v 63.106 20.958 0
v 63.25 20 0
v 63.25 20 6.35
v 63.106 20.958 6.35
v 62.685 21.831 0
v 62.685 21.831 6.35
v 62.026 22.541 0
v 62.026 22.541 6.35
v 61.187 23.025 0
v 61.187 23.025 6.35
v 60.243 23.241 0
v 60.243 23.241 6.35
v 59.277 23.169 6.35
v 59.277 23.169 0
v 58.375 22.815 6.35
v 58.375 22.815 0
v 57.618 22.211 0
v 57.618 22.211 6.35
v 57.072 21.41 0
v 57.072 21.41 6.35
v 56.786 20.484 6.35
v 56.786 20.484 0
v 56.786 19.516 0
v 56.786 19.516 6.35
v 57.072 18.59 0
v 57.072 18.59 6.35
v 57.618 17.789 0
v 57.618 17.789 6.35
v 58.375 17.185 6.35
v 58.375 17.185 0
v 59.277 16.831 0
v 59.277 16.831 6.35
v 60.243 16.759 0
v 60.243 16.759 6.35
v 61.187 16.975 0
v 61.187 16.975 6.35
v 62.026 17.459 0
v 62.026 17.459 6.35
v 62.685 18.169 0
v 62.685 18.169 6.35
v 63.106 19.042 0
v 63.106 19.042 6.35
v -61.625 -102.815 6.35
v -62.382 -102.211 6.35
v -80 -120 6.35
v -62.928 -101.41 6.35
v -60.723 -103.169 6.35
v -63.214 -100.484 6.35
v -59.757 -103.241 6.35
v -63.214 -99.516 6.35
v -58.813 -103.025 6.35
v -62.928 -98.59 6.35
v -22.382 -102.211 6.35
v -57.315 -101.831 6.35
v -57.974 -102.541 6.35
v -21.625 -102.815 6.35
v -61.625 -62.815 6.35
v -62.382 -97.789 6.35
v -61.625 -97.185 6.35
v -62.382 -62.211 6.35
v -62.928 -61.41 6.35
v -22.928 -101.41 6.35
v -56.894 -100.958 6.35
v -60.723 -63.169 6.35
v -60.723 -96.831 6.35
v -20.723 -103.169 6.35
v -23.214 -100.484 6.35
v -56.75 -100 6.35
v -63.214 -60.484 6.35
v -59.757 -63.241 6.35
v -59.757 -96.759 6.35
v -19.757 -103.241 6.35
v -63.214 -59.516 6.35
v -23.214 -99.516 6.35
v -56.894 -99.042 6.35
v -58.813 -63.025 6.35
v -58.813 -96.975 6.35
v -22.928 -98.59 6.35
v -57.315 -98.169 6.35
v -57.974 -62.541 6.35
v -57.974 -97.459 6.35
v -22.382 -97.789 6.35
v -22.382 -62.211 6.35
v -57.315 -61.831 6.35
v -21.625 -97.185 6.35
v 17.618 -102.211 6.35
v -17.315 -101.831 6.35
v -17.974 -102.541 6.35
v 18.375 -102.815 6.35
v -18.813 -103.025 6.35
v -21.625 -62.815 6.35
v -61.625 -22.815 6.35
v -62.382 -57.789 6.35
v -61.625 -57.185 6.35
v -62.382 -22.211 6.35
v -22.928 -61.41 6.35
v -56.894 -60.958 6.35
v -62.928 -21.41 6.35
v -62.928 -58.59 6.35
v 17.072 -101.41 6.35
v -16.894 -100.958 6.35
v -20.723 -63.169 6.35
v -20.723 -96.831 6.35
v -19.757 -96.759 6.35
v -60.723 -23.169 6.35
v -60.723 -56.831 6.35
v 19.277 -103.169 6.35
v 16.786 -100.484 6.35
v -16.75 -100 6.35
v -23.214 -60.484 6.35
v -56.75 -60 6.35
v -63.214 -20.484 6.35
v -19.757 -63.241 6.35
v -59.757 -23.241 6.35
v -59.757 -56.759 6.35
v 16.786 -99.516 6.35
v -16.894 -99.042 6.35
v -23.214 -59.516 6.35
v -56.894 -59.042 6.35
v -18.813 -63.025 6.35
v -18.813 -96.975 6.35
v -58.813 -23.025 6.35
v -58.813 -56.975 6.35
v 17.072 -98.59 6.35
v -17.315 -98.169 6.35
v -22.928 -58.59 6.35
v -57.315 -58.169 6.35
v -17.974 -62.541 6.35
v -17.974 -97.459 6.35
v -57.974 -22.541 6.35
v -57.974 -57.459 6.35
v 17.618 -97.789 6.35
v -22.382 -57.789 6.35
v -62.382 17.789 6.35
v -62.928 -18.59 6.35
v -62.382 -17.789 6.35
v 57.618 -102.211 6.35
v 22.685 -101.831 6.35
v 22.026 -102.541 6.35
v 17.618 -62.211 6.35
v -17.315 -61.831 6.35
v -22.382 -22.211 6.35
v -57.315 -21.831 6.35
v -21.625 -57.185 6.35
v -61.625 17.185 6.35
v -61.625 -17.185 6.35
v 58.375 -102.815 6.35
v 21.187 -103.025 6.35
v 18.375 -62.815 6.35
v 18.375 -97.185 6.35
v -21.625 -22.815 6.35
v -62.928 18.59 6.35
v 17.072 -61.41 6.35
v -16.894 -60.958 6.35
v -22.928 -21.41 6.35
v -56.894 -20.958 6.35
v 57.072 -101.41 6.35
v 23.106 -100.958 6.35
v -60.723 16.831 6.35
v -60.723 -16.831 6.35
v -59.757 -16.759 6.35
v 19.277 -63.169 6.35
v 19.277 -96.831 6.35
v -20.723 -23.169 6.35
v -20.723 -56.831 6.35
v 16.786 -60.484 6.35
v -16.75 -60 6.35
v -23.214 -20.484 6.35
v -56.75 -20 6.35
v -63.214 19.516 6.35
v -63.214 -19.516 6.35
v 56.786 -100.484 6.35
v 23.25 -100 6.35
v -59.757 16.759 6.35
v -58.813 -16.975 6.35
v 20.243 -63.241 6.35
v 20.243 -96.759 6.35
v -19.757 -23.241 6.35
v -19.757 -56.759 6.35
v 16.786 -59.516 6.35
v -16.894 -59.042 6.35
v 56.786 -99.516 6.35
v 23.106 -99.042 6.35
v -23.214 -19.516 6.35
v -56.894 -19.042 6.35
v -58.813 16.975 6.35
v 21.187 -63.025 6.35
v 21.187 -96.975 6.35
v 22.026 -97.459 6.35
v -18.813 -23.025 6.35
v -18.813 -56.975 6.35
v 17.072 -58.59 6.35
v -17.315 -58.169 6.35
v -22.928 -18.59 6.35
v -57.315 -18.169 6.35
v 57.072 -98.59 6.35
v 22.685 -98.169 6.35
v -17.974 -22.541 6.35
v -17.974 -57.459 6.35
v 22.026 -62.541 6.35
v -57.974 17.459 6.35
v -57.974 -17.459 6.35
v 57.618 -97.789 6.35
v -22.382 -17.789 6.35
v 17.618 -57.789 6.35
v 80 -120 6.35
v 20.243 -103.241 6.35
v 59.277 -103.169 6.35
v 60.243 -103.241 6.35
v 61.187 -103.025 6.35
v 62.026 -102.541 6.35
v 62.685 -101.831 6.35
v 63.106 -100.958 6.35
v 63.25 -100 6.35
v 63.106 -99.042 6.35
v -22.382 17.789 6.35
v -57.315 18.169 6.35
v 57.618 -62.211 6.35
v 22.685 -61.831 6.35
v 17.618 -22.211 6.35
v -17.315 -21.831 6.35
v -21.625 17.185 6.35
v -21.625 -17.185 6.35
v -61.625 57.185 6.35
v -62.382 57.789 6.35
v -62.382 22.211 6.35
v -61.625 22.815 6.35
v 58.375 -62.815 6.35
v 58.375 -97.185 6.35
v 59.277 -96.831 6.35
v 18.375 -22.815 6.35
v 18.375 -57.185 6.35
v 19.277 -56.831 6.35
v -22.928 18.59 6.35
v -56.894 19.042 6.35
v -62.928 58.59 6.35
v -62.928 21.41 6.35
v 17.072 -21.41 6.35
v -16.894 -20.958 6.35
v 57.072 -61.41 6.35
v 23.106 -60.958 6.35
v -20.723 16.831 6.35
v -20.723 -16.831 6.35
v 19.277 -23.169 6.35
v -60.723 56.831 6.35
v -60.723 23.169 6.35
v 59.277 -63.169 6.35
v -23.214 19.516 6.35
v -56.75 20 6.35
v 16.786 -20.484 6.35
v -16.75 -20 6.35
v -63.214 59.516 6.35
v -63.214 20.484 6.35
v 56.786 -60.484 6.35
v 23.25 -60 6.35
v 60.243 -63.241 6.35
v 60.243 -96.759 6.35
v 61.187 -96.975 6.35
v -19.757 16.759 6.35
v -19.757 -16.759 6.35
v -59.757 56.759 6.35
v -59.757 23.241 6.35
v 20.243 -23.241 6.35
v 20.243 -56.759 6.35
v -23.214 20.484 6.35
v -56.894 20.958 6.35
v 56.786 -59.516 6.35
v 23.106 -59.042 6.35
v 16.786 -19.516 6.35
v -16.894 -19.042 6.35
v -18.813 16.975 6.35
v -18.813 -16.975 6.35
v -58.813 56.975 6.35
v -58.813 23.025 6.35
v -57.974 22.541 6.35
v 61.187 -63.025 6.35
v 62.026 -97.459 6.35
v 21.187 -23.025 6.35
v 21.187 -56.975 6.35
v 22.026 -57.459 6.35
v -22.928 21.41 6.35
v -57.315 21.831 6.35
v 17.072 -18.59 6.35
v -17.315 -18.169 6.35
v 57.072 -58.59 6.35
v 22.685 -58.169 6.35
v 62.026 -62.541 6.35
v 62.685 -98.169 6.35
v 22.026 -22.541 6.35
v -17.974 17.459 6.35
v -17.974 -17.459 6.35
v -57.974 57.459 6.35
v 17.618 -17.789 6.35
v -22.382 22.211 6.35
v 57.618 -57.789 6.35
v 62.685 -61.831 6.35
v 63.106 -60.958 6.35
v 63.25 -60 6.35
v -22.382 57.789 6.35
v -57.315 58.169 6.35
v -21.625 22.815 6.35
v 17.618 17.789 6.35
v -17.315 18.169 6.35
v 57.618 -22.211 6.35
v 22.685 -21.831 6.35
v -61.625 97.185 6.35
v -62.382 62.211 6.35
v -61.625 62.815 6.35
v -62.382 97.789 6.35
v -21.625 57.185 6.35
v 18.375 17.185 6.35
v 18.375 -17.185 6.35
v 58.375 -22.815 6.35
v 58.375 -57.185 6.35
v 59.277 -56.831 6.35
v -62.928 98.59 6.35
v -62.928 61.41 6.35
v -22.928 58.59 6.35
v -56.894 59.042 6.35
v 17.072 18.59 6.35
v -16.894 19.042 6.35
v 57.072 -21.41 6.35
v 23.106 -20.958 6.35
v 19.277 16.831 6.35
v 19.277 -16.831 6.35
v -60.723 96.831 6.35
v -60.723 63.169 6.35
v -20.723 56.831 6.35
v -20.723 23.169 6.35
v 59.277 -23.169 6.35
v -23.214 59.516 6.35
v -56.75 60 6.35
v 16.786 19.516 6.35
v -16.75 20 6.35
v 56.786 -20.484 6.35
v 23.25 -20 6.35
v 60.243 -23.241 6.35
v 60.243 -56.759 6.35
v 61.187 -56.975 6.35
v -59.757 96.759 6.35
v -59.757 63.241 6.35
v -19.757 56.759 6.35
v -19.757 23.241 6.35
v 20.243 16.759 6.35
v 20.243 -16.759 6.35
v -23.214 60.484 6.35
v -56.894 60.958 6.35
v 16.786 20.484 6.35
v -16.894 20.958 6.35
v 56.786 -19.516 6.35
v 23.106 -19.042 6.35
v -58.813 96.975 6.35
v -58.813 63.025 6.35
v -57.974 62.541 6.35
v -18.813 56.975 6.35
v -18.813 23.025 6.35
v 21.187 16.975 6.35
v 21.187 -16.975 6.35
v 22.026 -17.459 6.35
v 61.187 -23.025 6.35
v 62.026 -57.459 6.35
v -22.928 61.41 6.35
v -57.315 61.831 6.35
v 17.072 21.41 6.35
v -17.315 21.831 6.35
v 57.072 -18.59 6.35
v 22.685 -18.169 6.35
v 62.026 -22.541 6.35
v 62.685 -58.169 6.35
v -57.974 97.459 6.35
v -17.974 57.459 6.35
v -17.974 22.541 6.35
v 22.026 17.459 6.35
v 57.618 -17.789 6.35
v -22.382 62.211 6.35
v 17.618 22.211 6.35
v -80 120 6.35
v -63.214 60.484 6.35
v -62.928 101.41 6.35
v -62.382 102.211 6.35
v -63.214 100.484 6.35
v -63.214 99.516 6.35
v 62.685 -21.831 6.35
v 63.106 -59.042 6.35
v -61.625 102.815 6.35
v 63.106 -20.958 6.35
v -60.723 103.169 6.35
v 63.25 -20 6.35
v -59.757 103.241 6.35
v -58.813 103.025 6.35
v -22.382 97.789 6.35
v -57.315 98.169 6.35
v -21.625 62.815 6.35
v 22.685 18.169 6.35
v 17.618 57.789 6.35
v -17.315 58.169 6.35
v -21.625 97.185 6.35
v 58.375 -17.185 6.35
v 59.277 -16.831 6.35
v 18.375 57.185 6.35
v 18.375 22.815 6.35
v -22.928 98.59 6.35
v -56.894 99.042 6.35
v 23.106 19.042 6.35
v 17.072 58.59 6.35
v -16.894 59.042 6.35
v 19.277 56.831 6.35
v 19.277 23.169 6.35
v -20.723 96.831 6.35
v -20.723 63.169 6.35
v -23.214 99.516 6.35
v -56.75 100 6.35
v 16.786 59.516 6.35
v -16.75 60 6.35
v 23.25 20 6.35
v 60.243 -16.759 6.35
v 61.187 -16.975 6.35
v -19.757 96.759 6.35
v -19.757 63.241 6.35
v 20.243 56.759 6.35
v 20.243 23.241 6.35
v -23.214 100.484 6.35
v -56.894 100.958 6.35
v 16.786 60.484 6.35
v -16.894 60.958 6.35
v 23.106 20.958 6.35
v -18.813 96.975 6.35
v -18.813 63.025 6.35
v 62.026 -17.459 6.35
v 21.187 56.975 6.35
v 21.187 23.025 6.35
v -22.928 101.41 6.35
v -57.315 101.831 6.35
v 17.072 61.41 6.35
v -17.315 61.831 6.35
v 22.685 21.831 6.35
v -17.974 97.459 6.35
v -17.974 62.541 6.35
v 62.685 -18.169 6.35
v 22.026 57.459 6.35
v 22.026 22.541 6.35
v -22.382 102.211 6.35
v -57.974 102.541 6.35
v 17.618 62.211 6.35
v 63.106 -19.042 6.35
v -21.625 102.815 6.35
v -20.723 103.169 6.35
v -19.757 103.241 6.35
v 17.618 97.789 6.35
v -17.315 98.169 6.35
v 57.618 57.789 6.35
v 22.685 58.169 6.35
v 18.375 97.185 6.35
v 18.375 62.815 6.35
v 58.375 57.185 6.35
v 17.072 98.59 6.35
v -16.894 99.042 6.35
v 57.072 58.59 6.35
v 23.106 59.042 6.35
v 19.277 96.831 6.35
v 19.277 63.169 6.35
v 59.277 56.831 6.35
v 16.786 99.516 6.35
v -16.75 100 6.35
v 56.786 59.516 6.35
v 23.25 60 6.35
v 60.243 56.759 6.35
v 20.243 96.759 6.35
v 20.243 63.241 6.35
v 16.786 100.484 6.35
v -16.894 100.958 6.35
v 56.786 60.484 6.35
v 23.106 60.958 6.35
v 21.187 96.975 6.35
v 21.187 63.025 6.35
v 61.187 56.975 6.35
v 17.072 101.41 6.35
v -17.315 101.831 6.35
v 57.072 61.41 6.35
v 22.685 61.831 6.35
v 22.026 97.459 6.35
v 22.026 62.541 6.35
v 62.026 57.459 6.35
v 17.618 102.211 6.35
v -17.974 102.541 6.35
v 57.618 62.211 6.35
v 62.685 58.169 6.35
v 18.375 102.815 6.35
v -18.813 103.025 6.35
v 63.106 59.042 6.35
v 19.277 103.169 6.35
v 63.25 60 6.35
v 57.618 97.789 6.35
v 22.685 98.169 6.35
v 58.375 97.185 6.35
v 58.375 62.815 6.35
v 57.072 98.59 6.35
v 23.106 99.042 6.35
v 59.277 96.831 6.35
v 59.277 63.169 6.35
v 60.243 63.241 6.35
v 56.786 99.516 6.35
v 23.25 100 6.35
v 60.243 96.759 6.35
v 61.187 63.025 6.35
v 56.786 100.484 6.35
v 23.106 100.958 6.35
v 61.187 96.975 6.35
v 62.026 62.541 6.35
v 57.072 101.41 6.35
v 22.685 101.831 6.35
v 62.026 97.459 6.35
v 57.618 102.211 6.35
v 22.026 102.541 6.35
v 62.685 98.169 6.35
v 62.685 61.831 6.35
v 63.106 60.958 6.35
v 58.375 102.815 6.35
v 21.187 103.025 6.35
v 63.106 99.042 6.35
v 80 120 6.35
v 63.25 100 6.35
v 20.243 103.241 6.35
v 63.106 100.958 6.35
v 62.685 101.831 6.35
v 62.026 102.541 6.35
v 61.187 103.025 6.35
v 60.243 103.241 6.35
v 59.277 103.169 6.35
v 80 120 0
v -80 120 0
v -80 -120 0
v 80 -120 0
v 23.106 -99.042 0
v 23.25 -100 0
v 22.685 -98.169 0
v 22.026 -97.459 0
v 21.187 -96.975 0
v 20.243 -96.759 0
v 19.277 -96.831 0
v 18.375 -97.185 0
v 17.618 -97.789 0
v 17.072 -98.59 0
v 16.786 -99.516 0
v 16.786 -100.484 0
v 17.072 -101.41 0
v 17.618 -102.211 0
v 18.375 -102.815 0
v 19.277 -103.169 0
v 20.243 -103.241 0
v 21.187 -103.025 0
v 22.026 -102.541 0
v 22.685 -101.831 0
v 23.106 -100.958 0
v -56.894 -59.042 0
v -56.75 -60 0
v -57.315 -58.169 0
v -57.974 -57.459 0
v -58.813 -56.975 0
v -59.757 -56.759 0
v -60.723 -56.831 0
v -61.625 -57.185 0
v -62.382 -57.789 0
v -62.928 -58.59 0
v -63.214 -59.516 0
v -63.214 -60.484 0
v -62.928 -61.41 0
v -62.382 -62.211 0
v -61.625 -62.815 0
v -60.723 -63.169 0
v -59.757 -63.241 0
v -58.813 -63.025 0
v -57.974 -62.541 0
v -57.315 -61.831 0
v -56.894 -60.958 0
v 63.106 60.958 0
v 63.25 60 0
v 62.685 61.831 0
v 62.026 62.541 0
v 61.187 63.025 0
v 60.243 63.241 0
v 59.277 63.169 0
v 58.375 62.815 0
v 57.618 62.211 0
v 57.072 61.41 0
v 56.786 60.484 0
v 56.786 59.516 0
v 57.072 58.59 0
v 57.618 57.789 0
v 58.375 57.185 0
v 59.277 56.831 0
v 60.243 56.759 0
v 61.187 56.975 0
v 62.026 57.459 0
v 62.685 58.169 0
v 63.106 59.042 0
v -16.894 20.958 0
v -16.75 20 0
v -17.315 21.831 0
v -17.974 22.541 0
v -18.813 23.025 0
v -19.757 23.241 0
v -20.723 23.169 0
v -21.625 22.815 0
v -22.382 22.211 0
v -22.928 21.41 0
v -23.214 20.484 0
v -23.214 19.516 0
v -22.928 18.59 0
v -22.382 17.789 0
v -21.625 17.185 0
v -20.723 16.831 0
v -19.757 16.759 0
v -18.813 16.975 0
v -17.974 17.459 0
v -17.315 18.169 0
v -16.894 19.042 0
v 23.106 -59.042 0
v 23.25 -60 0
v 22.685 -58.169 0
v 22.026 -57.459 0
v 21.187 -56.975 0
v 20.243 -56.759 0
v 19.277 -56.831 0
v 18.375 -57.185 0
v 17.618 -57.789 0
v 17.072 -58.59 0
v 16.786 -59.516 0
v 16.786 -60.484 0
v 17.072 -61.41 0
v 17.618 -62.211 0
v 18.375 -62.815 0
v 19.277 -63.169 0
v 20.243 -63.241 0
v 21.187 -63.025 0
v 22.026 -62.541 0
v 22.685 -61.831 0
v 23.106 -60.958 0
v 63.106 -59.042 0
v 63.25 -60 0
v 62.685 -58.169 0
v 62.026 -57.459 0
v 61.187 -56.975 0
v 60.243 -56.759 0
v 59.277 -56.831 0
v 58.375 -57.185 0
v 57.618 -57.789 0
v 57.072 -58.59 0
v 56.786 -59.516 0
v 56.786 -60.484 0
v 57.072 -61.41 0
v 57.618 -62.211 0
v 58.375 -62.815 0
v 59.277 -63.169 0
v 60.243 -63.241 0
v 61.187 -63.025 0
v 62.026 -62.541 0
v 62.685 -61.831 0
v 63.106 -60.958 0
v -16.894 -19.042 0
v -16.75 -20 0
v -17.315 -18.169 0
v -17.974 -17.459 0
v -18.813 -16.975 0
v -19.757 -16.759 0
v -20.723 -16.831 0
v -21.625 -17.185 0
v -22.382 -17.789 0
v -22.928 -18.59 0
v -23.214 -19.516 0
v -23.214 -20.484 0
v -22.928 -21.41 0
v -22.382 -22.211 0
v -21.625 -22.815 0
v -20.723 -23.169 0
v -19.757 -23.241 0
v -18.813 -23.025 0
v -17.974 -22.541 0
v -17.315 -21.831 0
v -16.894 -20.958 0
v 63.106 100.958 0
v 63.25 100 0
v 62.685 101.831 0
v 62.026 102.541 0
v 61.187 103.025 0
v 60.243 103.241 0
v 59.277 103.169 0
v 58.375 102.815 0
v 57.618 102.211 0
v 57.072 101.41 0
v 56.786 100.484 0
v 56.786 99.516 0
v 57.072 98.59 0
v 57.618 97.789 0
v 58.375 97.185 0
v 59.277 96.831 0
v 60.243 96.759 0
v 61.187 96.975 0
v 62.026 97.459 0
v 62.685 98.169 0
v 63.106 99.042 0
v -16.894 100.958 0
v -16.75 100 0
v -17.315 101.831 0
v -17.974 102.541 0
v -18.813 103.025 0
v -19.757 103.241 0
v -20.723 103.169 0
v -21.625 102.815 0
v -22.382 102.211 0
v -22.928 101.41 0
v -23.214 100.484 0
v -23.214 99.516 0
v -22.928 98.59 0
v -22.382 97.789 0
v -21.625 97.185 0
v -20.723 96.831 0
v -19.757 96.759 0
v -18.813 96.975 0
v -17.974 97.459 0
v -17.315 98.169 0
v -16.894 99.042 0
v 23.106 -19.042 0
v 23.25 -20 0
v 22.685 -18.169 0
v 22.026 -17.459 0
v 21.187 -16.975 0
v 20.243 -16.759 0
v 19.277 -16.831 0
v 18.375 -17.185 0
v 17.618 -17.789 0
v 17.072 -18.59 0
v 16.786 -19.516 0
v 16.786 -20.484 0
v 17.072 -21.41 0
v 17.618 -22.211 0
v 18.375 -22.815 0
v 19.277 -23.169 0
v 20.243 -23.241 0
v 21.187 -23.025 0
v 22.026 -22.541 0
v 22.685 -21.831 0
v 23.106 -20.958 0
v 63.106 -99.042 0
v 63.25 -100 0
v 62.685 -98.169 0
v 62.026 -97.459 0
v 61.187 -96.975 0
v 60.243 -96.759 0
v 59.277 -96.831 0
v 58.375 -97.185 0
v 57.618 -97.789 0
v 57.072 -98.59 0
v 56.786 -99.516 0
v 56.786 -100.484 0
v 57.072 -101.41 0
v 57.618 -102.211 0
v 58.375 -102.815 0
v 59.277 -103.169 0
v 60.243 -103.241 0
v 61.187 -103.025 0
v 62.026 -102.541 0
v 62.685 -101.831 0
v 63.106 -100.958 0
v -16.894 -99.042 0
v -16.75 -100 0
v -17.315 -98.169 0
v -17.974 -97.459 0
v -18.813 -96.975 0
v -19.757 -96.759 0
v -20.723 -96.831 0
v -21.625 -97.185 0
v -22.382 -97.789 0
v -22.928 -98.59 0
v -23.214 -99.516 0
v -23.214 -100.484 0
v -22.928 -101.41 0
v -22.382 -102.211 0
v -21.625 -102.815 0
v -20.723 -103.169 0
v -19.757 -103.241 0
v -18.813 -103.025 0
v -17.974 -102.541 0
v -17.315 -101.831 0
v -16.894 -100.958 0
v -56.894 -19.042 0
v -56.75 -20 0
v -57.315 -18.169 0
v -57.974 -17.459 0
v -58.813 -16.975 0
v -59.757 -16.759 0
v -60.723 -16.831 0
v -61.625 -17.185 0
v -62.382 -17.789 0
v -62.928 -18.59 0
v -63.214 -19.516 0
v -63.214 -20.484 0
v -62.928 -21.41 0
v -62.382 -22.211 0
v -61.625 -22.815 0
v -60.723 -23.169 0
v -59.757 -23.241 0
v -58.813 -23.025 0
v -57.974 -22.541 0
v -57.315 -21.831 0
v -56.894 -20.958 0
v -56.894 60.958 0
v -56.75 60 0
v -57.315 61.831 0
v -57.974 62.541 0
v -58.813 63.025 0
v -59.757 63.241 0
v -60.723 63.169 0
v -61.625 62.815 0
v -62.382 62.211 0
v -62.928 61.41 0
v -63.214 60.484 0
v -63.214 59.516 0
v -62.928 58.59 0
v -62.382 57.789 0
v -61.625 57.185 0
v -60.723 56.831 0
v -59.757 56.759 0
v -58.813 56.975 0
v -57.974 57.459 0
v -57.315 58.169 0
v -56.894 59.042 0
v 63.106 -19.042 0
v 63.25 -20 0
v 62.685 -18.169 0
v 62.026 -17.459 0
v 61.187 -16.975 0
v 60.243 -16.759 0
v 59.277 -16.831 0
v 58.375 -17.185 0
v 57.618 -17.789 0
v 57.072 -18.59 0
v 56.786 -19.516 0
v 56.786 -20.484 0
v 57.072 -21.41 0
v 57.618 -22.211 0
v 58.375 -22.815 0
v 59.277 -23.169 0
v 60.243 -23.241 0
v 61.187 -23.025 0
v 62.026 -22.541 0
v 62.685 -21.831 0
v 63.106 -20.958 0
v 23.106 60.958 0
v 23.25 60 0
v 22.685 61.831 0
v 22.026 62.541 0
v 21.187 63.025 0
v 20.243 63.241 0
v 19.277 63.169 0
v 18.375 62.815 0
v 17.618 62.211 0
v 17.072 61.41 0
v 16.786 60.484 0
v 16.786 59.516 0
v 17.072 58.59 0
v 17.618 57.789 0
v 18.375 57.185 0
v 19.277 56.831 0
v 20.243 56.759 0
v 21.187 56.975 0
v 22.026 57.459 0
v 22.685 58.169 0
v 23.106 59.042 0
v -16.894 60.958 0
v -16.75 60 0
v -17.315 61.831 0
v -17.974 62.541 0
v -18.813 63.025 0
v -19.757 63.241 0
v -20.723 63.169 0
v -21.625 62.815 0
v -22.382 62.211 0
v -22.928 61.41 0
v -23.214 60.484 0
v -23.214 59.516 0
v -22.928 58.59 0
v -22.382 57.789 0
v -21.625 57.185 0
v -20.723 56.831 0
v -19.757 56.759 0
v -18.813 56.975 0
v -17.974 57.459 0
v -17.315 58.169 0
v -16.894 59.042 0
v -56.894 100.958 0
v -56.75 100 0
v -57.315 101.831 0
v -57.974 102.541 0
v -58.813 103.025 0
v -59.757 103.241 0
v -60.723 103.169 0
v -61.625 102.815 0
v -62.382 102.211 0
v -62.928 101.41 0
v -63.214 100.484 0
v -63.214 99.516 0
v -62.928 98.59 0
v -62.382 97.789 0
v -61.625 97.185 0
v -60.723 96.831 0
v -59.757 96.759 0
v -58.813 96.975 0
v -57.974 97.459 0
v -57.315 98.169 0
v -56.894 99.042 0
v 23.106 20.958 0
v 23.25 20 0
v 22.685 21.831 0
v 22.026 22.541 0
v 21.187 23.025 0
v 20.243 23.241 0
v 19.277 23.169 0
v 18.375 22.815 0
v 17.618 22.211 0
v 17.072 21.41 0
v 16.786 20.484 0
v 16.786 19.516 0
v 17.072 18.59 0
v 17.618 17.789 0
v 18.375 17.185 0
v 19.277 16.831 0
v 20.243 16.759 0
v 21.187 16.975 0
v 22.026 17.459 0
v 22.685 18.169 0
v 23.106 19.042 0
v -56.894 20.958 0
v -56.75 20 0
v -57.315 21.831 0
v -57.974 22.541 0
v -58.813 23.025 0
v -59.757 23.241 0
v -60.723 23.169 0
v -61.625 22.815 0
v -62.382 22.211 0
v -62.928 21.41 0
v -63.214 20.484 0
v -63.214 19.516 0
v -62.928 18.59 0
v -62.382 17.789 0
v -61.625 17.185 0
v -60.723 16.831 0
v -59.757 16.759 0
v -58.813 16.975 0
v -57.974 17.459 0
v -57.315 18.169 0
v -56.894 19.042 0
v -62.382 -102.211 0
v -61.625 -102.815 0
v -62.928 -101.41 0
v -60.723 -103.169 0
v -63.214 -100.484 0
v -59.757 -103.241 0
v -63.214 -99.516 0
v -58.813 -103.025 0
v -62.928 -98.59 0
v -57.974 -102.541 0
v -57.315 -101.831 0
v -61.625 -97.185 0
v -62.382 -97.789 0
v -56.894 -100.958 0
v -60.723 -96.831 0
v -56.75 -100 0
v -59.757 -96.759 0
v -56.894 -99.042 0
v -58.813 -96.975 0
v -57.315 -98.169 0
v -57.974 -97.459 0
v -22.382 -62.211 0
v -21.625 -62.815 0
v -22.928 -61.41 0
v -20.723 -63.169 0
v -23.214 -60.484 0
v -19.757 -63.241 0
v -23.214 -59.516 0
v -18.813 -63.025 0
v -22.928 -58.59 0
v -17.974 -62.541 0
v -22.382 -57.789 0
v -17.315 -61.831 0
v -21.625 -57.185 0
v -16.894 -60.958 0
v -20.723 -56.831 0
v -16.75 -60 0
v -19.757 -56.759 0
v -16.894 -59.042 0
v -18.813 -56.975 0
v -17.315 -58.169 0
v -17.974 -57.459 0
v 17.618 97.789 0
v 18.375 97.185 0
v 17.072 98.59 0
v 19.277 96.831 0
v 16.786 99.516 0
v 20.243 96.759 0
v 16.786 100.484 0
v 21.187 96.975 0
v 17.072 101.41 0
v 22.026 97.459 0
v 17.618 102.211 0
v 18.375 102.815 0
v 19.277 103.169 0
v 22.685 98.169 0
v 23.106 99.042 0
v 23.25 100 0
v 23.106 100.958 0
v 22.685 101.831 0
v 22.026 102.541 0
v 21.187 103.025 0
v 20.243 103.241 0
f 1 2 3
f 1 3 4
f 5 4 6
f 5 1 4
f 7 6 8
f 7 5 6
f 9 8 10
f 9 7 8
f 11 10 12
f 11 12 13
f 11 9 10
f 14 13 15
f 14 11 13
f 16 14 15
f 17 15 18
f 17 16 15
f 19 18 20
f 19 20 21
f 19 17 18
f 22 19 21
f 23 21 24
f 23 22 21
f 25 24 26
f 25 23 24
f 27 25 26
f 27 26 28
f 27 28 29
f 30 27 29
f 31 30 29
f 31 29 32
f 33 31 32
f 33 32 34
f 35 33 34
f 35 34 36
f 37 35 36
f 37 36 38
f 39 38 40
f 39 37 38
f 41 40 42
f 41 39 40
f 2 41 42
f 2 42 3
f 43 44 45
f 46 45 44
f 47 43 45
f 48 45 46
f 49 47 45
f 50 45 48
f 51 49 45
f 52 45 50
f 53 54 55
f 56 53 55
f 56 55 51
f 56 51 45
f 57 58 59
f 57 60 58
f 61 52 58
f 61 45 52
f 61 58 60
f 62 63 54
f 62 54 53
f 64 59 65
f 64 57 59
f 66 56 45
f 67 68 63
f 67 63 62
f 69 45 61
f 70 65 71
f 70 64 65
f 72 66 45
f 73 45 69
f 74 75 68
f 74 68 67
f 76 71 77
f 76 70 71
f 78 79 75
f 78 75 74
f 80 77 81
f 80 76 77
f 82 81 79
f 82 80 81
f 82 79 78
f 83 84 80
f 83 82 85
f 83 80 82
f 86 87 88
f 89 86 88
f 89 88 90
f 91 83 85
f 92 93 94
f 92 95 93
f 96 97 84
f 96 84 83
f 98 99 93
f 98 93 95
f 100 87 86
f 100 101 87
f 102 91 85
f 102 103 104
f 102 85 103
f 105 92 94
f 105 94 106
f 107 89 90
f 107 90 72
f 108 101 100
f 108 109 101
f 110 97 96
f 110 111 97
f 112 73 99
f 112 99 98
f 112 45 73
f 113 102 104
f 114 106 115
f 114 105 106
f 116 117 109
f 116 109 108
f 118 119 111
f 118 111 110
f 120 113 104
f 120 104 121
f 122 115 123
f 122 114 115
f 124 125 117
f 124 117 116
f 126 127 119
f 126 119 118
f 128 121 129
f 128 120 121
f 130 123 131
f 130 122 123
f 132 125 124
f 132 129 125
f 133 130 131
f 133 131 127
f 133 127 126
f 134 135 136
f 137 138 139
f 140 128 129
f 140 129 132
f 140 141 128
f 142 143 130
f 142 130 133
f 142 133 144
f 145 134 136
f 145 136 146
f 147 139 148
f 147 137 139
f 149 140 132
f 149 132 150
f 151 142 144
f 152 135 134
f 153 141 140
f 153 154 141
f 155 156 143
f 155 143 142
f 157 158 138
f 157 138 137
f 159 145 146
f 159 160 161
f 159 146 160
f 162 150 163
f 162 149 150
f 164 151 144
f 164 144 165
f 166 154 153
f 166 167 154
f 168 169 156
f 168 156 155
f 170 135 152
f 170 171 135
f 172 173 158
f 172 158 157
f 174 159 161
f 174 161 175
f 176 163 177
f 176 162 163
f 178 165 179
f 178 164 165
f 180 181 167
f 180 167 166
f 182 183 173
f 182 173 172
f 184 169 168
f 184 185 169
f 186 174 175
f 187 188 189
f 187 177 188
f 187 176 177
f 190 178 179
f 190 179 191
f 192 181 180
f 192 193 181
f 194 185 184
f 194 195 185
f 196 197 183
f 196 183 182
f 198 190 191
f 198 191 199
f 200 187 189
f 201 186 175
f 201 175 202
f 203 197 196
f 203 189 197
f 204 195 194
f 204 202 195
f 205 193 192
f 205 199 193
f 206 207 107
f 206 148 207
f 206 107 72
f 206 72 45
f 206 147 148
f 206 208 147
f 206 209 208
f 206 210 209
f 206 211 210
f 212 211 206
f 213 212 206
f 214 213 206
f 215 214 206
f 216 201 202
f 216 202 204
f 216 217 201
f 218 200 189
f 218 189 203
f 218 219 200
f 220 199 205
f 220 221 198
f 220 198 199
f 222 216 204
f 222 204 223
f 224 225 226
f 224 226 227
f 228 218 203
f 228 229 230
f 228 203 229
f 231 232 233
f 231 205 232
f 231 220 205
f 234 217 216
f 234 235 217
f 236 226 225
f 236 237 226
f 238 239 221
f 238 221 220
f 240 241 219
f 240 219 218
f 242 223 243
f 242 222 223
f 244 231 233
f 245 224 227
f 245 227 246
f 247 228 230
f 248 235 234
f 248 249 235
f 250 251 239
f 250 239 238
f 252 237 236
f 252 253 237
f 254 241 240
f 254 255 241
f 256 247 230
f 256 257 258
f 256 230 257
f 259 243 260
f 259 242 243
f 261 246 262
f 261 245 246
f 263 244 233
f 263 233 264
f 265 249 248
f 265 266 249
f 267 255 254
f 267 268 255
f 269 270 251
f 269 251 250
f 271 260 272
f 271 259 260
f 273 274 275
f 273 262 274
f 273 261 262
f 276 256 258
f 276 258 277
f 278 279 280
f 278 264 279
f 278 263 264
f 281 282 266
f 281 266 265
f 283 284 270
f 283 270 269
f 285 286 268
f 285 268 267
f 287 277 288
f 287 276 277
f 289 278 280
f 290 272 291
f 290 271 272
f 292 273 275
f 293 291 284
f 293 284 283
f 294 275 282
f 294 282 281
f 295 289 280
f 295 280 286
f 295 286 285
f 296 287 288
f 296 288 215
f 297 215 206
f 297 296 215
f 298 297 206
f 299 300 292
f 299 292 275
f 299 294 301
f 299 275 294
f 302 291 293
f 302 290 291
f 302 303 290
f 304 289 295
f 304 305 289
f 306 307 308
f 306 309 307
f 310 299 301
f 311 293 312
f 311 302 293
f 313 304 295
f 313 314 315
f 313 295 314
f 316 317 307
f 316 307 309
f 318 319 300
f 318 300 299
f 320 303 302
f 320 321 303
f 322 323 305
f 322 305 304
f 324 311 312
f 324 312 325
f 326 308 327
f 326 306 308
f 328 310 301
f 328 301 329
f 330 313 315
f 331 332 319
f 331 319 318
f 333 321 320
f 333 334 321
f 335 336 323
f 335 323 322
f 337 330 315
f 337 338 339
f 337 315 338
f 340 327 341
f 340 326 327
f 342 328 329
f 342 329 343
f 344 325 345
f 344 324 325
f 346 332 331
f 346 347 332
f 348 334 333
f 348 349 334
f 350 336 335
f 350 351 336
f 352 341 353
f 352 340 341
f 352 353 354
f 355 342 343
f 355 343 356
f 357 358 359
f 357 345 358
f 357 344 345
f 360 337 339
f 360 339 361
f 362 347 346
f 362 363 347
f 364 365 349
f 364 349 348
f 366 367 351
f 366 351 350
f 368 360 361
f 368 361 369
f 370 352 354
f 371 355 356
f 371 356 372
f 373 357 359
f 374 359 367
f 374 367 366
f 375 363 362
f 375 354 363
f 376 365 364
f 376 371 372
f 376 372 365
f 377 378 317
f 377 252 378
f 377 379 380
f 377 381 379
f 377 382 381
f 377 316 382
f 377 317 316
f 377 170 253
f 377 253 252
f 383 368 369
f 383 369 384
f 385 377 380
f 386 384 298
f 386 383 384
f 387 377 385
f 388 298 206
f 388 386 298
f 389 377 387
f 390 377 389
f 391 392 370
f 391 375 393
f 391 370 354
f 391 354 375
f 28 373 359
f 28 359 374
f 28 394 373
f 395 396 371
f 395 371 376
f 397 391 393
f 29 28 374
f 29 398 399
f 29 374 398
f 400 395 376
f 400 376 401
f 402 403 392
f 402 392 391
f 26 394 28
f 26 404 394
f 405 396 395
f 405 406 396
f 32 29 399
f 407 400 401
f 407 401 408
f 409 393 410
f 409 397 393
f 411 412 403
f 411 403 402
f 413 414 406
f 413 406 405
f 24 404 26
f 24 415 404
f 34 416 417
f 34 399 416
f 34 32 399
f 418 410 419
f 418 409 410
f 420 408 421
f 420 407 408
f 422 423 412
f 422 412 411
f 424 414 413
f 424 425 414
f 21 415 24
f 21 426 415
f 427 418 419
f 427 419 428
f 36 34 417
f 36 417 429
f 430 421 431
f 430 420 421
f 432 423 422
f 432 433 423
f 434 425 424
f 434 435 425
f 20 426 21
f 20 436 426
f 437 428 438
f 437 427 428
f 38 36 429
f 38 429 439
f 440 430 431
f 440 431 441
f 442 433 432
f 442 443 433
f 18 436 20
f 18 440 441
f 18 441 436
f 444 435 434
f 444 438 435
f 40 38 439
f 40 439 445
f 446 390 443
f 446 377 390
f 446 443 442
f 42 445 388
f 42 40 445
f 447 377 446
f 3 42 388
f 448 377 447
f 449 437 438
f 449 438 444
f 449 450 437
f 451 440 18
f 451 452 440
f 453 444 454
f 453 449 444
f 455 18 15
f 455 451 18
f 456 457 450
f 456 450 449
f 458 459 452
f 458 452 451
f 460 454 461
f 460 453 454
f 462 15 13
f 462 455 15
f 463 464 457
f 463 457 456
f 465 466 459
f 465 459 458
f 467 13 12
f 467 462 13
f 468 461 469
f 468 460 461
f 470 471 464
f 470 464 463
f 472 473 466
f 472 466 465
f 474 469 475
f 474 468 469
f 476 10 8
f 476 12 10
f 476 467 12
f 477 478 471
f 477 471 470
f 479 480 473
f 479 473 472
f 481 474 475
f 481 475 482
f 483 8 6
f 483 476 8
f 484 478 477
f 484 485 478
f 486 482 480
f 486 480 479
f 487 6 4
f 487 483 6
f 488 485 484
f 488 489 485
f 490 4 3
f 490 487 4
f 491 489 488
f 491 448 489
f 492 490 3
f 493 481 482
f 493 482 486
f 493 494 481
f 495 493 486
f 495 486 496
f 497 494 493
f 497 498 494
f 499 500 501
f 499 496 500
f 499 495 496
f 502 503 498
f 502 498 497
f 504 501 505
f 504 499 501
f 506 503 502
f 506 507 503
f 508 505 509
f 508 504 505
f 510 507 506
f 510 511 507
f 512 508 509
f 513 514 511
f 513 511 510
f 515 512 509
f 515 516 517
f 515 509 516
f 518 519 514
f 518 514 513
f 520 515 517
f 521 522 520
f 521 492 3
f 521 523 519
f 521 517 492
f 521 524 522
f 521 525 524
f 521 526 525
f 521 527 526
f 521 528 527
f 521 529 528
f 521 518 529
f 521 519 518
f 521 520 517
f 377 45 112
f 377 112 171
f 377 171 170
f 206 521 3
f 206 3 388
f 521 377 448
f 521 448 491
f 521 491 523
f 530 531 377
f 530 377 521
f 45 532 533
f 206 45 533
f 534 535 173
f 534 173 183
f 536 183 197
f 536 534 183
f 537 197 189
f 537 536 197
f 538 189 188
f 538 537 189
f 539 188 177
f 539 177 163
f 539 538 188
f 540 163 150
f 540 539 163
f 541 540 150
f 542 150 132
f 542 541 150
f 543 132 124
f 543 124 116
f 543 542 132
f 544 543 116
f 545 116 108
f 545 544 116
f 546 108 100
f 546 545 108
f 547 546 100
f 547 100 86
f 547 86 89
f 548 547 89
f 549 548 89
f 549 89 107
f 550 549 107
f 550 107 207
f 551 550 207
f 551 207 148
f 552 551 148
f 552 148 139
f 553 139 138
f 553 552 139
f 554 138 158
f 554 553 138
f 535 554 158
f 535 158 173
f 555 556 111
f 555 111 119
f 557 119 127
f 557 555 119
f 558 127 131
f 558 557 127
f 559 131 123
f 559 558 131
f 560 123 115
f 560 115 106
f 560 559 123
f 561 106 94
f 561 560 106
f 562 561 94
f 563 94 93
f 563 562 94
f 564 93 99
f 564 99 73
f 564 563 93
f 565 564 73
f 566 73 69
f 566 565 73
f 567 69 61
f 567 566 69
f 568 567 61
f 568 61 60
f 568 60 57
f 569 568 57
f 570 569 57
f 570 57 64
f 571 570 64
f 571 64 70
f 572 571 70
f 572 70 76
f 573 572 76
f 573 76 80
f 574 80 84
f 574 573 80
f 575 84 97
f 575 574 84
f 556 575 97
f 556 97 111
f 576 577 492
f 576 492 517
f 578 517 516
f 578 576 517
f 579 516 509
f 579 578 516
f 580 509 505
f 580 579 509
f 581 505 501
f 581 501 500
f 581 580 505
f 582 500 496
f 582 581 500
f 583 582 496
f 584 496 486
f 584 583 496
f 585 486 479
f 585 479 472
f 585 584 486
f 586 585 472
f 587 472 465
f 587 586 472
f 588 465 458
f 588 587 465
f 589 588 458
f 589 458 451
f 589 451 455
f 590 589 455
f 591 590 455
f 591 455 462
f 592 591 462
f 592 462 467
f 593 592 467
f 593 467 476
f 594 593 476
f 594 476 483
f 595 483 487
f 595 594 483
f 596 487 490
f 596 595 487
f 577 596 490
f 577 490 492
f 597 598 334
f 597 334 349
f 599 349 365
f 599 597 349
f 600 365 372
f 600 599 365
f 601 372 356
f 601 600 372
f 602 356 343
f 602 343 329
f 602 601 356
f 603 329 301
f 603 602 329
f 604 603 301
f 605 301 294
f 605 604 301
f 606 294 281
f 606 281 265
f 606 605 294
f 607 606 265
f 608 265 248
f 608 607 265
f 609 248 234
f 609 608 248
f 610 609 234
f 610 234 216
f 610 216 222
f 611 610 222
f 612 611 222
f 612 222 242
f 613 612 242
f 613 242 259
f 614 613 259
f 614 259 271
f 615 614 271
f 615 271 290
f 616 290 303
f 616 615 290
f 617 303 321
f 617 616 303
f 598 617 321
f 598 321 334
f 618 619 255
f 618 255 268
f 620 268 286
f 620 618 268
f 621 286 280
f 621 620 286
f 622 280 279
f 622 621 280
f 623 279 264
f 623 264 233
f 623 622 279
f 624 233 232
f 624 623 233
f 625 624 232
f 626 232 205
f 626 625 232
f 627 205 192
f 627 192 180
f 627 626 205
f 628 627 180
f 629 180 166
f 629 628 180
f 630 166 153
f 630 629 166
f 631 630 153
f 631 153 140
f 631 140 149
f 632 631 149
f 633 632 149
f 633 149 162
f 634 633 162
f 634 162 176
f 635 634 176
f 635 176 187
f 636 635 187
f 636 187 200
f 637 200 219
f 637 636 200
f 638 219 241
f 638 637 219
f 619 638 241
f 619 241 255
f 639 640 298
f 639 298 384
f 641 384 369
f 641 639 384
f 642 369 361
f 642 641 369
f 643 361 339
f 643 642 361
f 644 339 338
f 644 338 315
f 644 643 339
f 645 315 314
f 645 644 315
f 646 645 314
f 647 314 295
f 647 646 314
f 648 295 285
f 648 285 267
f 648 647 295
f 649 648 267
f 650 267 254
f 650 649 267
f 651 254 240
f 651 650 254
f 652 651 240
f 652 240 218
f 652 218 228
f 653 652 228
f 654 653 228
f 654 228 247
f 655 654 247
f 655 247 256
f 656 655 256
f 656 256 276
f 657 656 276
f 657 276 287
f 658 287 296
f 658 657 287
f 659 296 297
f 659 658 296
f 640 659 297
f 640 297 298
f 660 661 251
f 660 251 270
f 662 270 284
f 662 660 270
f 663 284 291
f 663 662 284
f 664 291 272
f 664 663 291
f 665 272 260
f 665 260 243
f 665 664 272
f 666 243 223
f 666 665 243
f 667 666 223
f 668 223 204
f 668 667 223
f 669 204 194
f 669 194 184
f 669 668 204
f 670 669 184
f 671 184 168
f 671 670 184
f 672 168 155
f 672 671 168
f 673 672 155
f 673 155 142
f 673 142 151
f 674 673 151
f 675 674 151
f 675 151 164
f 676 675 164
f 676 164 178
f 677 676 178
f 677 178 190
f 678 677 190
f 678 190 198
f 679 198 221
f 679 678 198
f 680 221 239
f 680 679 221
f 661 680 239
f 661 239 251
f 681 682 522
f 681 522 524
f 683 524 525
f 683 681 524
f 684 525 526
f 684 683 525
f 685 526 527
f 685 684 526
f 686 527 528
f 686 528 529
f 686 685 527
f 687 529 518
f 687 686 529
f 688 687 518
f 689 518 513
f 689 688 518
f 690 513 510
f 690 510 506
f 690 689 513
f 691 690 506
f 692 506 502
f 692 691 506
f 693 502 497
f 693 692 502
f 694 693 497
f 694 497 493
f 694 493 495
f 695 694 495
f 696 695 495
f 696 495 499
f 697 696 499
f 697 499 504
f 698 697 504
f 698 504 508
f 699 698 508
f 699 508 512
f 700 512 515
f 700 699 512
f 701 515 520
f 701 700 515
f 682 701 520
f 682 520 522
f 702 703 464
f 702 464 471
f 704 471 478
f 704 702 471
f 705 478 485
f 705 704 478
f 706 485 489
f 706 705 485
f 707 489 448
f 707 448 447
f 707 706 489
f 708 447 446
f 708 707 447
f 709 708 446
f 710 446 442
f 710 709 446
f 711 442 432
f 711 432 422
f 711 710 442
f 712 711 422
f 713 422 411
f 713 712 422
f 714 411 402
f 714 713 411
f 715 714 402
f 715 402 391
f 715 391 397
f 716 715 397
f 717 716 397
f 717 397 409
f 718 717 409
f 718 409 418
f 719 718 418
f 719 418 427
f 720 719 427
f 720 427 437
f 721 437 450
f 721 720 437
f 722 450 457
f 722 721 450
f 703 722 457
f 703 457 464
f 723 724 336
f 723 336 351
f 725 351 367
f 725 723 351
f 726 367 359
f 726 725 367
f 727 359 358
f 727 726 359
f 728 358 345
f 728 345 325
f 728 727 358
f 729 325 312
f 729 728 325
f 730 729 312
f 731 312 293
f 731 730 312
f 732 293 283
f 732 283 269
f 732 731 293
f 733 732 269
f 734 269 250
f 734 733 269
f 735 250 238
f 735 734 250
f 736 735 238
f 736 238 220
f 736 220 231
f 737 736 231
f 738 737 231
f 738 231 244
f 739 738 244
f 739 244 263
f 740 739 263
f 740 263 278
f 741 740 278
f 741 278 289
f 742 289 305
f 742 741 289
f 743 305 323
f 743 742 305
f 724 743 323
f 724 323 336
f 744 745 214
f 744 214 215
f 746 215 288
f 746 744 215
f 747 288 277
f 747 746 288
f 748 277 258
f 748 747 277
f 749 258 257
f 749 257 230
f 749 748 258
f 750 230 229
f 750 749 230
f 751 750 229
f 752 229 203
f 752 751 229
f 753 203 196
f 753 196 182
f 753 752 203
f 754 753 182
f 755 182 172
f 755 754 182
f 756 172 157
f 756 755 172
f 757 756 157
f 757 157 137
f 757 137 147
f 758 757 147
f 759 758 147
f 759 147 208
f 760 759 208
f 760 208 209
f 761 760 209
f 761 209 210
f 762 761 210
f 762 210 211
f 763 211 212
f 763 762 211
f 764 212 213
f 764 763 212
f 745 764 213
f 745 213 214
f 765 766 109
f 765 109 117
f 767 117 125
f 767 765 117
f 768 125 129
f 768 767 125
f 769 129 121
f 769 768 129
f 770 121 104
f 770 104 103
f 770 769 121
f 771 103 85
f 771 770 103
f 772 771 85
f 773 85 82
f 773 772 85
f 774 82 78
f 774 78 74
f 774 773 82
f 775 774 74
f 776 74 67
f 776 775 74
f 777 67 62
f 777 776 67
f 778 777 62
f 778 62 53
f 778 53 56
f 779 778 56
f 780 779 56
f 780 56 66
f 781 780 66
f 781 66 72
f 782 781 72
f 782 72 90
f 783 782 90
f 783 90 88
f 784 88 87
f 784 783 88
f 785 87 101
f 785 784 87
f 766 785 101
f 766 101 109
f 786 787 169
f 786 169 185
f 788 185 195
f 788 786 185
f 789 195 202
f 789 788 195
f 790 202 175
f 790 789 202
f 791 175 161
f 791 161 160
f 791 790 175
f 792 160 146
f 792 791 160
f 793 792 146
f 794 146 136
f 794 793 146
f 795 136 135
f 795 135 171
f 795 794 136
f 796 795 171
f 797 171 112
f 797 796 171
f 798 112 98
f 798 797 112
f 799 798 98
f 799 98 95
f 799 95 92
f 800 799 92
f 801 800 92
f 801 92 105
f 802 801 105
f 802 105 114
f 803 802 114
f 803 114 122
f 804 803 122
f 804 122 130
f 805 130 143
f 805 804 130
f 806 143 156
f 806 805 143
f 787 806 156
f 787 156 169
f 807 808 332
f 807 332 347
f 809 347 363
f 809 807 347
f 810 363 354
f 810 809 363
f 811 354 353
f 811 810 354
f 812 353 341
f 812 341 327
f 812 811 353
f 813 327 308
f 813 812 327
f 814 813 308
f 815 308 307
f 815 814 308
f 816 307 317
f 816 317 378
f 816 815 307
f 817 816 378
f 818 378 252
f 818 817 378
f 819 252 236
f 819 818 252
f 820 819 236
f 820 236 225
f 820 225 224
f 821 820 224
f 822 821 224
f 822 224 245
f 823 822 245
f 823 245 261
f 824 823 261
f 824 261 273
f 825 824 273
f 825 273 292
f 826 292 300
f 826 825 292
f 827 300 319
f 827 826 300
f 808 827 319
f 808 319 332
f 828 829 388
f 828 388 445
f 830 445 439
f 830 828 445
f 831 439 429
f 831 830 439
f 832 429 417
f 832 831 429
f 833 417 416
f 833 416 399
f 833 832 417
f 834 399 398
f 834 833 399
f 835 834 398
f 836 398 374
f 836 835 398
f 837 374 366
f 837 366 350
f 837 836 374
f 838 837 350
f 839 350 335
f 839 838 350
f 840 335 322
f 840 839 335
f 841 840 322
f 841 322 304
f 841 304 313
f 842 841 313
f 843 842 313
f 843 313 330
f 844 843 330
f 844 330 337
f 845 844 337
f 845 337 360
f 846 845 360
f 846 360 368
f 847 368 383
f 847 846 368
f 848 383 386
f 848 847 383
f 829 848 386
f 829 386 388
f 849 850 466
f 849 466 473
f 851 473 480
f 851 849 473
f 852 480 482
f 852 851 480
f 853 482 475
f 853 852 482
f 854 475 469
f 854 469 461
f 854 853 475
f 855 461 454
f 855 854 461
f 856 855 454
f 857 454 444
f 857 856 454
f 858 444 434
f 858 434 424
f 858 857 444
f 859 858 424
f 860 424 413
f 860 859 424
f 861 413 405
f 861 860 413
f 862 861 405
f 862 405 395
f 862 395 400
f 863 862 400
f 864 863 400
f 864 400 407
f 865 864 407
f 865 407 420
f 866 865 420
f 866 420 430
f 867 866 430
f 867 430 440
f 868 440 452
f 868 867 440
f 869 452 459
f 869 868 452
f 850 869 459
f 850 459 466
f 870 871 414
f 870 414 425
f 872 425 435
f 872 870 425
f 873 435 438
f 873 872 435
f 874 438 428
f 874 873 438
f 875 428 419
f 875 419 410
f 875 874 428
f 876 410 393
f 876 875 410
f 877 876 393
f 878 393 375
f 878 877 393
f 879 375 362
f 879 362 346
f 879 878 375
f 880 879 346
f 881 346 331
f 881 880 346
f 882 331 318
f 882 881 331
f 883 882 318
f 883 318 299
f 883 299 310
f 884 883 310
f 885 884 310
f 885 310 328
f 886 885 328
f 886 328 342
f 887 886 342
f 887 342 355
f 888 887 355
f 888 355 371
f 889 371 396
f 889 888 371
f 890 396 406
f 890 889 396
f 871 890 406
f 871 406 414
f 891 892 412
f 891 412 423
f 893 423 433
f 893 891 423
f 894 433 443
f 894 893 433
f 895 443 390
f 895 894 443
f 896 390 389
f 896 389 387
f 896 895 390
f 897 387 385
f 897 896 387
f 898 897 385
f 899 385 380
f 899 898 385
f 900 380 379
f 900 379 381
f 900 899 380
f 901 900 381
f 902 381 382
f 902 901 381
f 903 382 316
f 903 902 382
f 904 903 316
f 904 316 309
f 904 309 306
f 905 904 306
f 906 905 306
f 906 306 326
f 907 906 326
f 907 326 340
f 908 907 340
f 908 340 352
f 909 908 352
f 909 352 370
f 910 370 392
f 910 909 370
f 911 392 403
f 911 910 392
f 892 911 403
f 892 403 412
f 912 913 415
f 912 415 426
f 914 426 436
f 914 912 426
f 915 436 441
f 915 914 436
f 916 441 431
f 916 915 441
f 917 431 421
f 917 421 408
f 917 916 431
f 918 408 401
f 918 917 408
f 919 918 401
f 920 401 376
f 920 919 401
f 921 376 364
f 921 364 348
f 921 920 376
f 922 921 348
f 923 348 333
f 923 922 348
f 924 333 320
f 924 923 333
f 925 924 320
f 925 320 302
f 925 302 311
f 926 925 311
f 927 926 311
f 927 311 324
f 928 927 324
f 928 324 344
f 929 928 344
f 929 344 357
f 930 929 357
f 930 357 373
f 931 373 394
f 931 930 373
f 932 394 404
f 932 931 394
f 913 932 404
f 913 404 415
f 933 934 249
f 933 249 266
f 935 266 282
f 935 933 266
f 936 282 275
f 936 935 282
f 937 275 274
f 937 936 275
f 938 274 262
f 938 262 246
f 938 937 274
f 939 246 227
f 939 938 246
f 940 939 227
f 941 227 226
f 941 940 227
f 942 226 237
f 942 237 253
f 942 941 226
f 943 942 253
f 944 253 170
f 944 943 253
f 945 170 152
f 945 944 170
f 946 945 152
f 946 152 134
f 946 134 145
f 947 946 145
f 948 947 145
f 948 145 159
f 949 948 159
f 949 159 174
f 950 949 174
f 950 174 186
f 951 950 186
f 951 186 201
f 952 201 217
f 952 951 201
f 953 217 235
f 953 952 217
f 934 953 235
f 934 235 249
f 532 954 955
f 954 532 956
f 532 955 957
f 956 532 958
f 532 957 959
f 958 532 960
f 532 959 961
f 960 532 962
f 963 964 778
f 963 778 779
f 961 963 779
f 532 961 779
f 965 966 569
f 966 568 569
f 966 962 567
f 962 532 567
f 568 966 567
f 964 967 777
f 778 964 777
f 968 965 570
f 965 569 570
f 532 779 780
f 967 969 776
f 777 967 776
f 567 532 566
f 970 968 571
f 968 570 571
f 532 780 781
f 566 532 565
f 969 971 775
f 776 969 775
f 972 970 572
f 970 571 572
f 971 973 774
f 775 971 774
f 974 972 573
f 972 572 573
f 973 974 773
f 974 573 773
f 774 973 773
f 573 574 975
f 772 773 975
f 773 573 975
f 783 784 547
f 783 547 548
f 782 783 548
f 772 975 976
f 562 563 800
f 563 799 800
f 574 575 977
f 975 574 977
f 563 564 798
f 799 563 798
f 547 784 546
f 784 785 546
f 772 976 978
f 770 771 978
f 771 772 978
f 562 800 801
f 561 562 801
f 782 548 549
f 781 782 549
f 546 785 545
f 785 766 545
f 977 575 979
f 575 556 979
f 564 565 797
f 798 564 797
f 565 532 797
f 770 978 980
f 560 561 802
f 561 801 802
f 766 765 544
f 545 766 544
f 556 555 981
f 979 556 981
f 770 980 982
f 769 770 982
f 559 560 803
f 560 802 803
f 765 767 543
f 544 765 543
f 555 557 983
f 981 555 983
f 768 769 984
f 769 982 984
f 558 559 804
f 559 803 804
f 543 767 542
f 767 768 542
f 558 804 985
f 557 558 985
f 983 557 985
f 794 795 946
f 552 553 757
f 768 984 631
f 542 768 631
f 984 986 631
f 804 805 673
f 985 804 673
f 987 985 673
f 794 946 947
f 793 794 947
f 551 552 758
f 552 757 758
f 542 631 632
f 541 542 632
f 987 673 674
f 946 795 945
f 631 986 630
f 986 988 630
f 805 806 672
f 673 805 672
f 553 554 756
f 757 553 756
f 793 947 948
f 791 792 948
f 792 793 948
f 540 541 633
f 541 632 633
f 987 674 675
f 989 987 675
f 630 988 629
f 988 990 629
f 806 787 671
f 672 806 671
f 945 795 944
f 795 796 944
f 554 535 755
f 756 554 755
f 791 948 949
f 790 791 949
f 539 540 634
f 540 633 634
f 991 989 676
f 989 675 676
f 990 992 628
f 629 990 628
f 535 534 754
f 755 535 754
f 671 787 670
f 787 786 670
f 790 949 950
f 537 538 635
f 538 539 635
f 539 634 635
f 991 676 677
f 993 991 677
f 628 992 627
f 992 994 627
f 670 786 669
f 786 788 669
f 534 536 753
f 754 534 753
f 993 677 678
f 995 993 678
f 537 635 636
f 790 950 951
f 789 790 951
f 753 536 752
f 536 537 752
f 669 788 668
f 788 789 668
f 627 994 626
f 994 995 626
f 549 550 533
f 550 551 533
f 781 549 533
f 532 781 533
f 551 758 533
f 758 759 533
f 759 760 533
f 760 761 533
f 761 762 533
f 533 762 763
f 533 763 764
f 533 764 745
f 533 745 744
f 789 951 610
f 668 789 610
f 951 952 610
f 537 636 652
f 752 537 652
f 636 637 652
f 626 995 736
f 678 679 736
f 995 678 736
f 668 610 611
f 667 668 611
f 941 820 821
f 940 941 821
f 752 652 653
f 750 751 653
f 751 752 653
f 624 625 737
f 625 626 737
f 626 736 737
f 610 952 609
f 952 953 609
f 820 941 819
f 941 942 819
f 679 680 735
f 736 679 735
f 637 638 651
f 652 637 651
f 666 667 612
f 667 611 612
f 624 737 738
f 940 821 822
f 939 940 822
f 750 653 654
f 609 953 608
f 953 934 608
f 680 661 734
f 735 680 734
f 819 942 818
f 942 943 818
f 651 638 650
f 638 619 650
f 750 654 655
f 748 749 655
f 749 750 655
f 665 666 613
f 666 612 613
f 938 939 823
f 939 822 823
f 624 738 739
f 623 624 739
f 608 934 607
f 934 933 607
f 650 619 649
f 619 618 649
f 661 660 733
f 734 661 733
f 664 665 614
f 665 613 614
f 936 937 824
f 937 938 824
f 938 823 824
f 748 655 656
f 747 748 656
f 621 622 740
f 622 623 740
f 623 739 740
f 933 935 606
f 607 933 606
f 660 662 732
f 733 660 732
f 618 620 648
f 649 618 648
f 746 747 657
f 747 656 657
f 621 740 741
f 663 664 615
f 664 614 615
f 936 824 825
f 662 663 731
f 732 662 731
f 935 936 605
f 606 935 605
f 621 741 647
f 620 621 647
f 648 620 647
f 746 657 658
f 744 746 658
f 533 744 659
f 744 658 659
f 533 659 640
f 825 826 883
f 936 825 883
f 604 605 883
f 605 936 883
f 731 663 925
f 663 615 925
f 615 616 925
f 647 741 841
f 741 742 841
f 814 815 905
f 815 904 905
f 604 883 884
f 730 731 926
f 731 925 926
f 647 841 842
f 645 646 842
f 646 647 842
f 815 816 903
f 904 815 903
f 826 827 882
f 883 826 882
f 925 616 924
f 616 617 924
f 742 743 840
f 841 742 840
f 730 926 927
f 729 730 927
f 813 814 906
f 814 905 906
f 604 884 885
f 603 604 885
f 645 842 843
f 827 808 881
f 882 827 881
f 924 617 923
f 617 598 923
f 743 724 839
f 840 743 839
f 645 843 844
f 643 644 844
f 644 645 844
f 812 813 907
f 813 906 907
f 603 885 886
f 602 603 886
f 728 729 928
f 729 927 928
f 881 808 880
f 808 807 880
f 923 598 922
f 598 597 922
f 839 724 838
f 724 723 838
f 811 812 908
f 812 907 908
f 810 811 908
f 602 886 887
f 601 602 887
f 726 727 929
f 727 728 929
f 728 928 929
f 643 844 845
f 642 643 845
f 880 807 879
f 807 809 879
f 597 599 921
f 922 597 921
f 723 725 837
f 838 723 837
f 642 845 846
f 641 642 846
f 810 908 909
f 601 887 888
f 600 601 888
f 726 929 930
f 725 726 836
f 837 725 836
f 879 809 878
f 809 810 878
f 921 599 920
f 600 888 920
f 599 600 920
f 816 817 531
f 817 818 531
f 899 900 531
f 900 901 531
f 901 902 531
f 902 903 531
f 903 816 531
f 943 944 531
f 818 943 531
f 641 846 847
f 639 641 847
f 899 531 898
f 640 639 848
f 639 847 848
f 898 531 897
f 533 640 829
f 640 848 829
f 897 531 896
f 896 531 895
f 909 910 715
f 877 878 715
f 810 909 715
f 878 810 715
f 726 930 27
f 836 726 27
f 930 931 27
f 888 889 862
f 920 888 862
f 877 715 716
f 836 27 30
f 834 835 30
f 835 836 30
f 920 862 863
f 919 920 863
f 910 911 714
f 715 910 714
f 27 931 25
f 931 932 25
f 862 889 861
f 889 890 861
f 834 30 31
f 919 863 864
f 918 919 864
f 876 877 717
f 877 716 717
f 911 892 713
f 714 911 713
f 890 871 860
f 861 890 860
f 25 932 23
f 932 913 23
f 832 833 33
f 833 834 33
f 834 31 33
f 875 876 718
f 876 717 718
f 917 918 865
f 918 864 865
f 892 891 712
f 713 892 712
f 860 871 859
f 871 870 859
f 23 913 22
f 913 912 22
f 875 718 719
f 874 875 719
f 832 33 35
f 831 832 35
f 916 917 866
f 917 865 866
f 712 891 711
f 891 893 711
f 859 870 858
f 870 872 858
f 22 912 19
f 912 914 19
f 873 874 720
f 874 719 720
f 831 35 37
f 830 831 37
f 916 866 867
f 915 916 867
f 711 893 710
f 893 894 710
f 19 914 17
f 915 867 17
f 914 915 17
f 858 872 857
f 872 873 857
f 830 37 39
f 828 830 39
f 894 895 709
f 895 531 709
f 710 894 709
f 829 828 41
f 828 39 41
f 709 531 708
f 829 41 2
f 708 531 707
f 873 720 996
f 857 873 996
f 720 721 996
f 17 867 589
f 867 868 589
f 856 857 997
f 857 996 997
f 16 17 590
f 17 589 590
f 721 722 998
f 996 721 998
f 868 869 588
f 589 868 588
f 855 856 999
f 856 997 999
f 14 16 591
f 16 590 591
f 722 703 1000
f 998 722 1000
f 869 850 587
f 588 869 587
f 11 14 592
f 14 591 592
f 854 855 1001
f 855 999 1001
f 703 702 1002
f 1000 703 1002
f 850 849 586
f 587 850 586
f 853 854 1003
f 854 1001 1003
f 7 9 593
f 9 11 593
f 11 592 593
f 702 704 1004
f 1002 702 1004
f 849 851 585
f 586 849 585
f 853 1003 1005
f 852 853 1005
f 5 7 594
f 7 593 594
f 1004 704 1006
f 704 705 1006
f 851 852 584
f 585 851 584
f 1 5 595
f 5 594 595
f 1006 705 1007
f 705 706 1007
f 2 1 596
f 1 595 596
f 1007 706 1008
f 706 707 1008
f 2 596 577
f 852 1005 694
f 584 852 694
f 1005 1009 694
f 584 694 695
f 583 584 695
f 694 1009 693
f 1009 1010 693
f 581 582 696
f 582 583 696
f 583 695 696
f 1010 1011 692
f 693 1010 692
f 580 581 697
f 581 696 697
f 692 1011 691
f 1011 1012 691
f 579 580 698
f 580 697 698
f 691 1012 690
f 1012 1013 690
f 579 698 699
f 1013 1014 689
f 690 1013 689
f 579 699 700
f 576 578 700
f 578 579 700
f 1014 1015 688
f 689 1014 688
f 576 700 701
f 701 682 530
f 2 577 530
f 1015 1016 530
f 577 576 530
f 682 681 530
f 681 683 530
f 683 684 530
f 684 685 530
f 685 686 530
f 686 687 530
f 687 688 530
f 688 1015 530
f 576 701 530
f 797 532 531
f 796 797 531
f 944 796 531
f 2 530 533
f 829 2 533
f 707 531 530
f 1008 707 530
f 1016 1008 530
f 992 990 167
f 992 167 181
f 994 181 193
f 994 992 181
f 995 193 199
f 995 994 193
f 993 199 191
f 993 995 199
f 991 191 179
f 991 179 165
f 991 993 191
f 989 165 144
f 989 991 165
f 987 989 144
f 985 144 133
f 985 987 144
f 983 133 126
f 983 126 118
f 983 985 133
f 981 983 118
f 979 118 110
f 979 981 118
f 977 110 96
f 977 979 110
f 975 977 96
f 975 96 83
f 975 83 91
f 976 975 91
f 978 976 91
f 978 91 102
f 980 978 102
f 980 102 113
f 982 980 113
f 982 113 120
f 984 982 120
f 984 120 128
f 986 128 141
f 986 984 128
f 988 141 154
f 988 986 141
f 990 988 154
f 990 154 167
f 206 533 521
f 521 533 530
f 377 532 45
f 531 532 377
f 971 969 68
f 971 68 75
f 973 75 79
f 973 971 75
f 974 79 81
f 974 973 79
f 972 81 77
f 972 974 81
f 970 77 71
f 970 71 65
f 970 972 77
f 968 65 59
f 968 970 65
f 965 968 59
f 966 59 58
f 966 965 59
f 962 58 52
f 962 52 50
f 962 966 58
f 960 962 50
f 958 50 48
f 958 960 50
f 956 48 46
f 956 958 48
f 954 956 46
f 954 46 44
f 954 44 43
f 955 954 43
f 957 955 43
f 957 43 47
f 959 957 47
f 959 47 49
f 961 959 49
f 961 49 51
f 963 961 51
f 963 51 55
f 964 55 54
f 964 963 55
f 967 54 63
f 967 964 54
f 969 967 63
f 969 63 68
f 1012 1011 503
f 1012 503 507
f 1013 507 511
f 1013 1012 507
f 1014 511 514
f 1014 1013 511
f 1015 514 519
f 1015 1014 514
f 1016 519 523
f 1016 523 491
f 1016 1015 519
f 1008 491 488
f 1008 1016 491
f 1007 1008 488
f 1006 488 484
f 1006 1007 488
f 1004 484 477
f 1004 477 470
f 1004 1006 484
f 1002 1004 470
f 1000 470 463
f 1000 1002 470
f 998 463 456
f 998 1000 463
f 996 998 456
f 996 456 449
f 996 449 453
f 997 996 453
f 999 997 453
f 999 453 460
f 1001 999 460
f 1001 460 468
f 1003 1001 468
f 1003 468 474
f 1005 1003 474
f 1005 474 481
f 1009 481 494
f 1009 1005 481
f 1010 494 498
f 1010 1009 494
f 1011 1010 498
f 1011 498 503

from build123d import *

# Parameters (mm, degrees)
F0_W     = 160
F0_H     = 240
F0_R     = 3.25
F1_DEPTH = 6.35


# Not quite as in the source:
# - a length typed as a fraction of an inch, garbled in the dataset ("3 / 203.2 mm" for 3/8 in), is restored


with BuildPart() as f1:
    # F0 (on Top) → F1 (new body)
    with BuildSketch(Plane.XY):
        Rectangle(F0_W, F0_H)
        with Locations((-60, -100)):
            Circle(F0_R, mode=Mode.SUBTRACT)
        with Locations((-20, -100)):
            Circle(F0_R, mode=Mode.SUBTRACT)
        with Locations((-60, -60)):
            Circle(F0_R, mode=Mode.SUBTRACT)
        with Locations((-60, -20)):
            Circle(F0_R, mode=Mode.SUBTRACT)
        with Locations((-20, -60)):
            Circle(F0_R, mode=Mode.SUBTRACT)
        with Locations((-20, -20)):
            Circle(F0_R, mode=Mode.SUBTRACT)
        with Locations((20, -100)):
            Circle(F0_R, mode=Mode.SUBTRACT)
        with Locations((60, -100)):
            Circle(F0_R, mode=Mode.SUBTRACT)
        with Locations((20, -60)):
            Circle(F0_R, mode=Mode.SUBTRACT)
        with Locations((20, -20)):
            Circle(F0_R, mode=Mode.SUBTRACT)
        with Locations((60, -60)):
            Circle(F0_R, mode=Mode.SUBTRACT)
        with Locations((60, -20)):
            Circle(F0_R, mode=Mode.SUBTRACT)
        with Locations((-60, 20)):
            Circle(F0_R, mode=Mode.SUBTRACT)
        with Locations((-20, 20)):
            Circle(F0_R, mode=Mode.SUBTRACT)
        with Locations((-60, 60)):
            Circle(F0_R, mode=Mode.SUBTRACT)
        with Locations((-60, 100)):
            Circle(F0_R, mode=Mode.SUBTRACT)
        with Locations((-20, 60)):
            Circle(F0_R, mode=Mode.SUBTRACT)
        with Locations((-20, 100)):
            Circle(F0_R, mode=Mode.SUBTRACT)
        with Locations((20, 20)):
            Circle(F0_R, mode=Mode.SUBTRACT)
        with Locations((60, 20)):
            Circle(F0_R, mode=Mode.SUBTRACT)
        with Locations((20, 60)):
            Circle(F0_R, mode=Mode.SUBTRACT)
        with Locations((20, 100)):
            Circle(F0_R, mode=Mode.SUBTRACT)
        with Locations((60, 60)):
            Circle(F0_R, mode=Mode.SUBTRACT)
        with Locations((60, 100)):
            Circle(F0_R, mode=Mode.SUBTRACT)
    extrude(amount=F1_DEPTH)


solid = f1.part
